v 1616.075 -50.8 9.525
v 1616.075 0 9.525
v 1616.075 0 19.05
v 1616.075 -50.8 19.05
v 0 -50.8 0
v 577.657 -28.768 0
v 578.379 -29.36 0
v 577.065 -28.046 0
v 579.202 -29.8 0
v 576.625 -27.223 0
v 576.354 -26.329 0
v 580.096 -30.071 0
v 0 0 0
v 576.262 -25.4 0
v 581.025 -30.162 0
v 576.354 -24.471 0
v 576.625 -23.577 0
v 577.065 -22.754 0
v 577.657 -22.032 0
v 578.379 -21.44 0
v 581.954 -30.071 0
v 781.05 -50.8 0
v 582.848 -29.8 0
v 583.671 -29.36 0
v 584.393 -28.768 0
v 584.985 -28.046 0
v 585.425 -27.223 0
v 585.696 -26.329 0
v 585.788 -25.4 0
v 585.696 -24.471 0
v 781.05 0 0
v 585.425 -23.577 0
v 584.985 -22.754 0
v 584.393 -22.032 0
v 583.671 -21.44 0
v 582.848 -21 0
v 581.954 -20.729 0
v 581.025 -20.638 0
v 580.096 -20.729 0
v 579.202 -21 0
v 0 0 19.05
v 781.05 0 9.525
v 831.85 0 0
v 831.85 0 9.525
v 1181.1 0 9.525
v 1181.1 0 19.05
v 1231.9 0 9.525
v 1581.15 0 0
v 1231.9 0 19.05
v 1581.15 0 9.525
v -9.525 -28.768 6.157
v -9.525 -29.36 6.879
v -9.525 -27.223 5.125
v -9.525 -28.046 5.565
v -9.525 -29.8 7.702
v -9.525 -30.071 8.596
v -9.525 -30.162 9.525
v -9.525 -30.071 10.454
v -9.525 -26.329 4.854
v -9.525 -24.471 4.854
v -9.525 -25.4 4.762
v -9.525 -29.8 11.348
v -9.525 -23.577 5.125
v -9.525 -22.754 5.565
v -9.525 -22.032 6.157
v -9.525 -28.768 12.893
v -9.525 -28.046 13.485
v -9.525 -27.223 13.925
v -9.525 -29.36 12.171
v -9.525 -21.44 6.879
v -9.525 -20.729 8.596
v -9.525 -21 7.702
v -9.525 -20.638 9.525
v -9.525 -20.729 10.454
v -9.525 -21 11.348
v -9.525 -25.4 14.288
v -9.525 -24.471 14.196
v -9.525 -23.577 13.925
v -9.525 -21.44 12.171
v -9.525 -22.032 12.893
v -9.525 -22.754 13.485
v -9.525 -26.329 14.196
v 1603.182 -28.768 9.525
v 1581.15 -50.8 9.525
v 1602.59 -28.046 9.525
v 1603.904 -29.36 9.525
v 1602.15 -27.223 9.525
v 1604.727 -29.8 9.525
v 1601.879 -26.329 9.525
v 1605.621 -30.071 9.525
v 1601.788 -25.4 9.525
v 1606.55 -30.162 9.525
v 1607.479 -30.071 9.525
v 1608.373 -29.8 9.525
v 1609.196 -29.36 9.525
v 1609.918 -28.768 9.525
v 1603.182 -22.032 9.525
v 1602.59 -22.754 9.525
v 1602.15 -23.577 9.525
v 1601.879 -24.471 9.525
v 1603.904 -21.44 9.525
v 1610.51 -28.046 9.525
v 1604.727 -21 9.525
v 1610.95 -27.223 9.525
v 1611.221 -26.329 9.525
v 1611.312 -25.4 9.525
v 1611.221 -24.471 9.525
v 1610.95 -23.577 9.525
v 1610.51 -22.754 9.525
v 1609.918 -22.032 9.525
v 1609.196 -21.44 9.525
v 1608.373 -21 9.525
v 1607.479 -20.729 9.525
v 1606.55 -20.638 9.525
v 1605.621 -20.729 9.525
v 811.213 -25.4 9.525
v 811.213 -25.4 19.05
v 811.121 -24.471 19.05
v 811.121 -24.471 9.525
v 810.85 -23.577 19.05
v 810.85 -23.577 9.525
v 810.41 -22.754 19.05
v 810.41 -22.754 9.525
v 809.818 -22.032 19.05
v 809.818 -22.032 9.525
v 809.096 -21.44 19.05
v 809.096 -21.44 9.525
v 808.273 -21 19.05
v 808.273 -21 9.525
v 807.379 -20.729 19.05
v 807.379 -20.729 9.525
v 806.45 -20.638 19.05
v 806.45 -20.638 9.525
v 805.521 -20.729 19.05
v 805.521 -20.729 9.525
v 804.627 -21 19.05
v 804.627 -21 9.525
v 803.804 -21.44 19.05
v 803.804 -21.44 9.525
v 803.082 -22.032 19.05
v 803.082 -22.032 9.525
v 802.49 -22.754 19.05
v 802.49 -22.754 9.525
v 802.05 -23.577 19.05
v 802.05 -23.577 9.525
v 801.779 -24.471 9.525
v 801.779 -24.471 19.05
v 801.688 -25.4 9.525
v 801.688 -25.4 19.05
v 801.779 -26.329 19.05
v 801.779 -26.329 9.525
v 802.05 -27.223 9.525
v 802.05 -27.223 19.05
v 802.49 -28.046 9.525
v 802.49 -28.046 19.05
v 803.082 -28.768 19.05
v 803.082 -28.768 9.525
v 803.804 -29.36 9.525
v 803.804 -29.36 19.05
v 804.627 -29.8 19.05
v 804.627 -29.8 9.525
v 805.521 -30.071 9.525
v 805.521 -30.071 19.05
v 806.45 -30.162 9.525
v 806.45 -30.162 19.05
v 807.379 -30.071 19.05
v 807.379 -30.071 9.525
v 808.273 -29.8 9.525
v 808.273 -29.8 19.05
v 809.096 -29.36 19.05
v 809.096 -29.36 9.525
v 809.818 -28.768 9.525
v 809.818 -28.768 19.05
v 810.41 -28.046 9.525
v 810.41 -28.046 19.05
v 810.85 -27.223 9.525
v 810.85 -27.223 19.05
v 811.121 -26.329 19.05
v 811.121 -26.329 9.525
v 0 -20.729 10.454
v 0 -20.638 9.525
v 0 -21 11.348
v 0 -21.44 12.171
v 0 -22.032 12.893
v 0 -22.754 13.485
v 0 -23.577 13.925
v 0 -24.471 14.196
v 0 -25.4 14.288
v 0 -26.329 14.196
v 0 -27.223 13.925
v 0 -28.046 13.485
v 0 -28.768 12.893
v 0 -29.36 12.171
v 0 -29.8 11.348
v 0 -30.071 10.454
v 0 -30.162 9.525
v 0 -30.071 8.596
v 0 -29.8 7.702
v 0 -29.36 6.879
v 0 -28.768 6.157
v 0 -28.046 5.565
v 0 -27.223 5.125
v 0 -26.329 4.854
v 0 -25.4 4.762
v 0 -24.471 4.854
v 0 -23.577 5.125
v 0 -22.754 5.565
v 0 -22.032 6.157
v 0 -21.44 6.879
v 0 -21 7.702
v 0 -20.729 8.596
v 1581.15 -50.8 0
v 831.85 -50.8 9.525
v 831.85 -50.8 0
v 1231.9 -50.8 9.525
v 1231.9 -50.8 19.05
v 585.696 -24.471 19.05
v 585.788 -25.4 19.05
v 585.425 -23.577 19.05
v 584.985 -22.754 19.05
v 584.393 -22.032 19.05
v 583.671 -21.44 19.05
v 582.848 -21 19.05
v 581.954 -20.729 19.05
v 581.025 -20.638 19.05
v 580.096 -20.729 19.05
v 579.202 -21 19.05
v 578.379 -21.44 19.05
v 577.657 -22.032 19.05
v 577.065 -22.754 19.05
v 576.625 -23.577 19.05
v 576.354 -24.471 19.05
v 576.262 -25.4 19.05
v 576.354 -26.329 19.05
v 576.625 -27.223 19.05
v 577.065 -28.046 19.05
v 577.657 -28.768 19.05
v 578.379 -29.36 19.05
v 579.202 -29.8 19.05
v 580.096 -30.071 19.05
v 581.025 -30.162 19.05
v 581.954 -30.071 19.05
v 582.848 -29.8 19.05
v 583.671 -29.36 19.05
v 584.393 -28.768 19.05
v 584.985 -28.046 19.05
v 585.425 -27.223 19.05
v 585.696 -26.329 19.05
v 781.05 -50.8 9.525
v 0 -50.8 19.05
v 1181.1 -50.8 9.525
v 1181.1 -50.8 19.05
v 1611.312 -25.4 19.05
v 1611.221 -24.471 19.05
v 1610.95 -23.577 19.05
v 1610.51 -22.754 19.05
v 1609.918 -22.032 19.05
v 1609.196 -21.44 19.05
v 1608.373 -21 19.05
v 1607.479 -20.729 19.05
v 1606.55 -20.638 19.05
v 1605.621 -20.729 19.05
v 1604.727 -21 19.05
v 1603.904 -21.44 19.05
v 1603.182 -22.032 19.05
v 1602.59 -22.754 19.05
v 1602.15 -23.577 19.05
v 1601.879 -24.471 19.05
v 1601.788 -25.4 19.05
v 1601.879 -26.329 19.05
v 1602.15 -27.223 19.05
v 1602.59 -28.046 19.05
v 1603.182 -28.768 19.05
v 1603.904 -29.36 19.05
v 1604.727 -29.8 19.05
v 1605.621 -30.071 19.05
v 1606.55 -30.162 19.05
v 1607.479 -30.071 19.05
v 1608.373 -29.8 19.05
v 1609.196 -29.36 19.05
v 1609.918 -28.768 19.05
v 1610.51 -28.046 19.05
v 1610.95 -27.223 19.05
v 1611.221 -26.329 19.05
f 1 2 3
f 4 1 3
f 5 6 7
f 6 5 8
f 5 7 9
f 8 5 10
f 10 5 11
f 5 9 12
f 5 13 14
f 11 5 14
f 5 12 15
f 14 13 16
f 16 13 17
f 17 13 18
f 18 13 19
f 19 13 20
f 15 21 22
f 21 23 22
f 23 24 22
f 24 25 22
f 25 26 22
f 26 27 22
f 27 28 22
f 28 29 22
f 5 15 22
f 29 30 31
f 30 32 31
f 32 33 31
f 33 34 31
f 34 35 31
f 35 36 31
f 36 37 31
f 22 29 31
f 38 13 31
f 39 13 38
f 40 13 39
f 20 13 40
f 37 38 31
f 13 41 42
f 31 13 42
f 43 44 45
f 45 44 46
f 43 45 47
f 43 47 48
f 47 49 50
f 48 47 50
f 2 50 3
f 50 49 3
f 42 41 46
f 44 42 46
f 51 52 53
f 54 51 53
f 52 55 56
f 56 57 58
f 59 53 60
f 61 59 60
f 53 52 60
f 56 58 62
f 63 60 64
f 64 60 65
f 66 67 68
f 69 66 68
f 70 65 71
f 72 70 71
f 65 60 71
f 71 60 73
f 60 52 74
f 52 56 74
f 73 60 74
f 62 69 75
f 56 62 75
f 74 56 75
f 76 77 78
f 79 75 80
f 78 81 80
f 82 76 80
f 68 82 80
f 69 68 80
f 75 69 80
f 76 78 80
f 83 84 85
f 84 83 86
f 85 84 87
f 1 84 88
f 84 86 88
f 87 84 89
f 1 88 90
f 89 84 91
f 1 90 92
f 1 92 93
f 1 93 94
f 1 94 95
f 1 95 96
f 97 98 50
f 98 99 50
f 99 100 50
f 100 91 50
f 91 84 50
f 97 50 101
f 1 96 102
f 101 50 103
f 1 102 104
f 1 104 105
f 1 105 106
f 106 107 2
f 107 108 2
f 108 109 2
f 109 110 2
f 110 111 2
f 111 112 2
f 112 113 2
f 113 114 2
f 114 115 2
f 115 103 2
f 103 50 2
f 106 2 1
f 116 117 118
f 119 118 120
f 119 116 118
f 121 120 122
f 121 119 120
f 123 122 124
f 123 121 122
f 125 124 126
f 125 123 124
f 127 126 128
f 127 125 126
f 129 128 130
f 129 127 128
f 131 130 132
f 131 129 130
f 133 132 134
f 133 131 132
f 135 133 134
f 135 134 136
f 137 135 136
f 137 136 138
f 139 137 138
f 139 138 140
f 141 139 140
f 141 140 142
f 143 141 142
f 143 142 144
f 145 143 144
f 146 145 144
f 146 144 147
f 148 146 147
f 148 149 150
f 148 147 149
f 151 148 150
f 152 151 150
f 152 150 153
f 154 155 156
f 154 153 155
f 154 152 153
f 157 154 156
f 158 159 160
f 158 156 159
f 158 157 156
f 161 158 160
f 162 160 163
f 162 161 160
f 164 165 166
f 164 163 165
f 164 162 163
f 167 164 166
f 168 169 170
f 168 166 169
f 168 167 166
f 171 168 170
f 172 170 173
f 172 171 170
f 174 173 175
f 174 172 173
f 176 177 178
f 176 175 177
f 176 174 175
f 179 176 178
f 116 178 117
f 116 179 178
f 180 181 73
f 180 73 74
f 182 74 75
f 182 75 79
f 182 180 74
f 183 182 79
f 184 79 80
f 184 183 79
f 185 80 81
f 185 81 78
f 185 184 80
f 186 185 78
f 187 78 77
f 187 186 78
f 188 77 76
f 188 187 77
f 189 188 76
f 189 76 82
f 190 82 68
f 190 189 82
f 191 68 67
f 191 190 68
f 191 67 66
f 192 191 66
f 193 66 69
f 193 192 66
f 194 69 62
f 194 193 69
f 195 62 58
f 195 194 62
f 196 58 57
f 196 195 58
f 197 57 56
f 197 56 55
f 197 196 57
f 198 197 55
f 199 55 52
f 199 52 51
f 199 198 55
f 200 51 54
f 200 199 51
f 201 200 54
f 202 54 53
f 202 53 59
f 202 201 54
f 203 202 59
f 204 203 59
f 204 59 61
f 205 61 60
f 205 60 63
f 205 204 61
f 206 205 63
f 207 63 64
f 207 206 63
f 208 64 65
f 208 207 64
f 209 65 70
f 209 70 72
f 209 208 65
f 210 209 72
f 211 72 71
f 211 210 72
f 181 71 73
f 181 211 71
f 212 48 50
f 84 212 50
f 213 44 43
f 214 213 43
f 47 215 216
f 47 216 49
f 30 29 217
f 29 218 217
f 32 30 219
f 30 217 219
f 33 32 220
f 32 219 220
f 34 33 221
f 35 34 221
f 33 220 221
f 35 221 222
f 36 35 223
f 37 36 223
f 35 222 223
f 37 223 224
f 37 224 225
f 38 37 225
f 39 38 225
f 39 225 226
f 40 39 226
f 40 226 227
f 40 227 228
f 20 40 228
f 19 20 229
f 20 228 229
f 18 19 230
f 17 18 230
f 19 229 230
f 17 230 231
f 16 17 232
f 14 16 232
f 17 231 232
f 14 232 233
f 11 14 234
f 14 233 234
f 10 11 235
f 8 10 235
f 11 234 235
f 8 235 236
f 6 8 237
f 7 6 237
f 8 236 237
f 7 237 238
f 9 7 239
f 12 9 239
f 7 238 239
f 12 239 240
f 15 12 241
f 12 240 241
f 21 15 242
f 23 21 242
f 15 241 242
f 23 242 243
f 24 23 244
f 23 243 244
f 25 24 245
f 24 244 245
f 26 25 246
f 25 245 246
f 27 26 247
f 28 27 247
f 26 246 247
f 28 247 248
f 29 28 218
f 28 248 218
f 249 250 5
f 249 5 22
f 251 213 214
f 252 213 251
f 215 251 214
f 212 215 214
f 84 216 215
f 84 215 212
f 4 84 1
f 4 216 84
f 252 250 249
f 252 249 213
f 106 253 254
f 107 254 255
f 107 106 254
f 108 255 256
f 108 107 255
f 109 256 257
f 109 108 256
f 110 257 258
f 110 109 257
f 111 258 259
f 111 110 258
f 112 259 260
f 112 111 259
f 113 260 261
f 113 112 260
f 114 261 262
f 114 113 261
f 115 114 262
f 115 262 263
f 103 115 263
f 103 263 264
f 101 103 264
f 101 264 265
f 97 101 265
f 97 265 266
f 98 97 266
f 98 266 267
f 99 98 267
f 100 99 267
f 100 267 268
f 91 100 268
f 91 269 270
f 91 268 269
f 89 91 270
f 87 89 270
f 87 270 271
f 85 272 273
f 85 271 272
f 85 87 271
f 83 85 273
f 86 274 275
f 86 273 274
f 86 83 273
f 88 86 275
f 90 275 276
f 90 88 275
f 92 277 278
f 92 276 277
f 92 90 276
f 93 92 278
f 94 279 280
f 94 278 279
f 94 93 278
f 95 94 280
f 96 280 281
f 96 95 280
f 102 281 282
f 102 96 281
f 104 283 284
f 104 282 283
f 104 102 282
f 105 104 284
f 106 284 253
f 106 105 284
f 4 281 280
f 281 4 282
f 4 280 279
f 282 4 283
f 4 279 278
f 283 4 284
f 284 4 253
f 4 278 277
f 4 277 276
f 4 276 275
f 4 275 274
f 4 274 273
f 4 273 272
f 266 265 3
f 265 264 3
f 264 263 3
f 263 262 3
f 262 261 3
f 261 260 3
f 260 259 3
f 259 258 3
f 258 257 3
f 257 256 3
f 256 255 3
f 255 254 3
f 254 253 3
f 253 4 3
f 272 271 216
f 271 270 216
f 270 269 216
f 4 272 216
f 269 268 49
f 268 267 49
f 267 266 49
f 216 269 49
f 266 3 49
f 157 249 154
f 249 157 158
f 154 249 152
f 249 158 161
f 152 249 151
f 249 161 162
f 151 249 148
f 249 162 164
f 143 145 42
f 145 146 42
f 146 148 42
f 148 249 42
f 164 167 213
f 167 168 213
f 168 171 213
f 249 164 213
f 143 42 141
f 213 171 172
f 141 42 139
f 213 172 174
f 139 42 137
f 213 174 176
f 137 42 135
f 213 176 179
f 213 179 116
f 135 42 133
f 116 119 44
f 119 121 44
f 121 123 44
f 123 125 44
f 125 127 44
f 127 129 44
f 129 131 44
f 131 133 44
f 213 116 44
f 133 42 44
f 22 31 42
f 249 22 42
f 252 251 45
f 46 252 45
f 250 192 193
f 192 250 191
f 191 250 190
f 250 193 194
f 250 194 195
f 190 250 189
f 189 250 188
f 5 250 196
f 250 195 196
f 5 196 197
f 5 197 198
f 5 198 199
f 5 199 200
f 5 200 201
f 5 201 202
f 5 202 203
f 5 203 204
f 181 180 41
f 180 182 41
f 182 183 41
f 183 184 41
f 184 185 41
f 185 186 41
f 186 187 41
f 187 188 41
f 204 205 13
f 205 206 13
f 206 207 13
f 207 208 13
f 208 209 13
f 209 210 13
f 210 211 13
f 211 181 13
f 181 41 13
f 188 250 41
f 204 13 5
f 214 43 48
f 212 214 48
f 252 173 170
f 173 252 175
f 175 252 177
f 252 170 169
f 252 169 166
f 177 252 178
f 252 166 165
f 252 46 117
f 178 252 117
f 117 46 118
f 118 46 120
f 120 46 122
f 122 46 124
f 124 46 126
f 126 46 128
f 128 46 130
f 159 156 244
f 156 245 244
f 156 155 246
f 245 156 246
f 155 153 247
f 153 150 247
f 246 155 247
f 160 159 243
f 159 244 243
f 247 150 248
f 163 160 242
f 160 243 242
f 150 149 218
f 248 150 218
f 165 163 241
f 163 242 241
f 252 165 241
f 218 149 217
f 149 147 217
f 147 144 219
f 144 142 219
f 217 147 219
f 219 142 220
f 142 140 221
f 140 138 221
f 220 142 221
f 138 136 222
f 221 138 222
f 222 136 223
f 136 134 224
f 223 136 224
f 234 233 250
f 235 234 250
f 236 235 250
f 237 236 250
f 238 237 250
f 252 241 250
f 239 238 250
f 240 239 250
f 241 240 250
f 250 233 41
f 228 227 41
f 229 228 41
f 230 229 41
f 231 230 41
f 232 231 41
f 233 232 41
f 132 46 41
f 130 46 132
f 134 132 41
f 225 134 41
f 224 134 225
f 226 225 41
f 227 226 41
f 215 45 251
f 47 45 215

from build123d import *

# Parameters (mm, degrees)
F1_DEPTH = 50.8
F3_R     = 4.7625
F4_DEPTH = 12.7
F5_R     = 4.7625
F6_DEPTH = 9.525
F7_W     = 50.8
F7_H     = 119.94423
F8_DEPTH = 25.4


with BuildPart() as f1:
    # F0 (on Front) → F1 (new body)
    with BuildSketch(Plane.XZ):
        Polygon((1616.075, 9.525), (1616.075, 19.05), (0, 19.05), (0, 0), (781.05, 0), (781.05, 9.525), (831.85, 9.525), (831.85, 0), (1581.15, 0), (1581.15, 9.525), align=None)
    extrude(amount=F1_DEPTH)

    # F3 (on offset) → F4 (cut, symmetric)
    with BuildSketch(Plane.XY.offset(9.525)):
        with Locations((806.45, -25.4)):
            Circle(F3_R)
        with Locations((1606.55, -25.4)):
            Circle(F3_R)
        with Locations((581.025, -25.4)):
            Circle(F3_R)
    extrude(amount=F4_DEPTH, both=True, mode=Mode.SUBTRACT)

    # F5 (on Right) → F6 (join)
    with BuildSketch(Plane.YZ):
        with Locations((-25.4, 9.525)):
            Circle(F5_R)
    extrude(amount=-F6_DEPTH)

    # F7 (on offset) → F8 (cut)
    with BuildSketch(Plane.XY.offset(9.525)):
        with Locations((1206.5, -29.657498)):
            Rectangle(F7_W, F7_H)
    extrude(amount=F8_DEPTH, mode=Mode.SUBTRACT)


solid = f1.part
